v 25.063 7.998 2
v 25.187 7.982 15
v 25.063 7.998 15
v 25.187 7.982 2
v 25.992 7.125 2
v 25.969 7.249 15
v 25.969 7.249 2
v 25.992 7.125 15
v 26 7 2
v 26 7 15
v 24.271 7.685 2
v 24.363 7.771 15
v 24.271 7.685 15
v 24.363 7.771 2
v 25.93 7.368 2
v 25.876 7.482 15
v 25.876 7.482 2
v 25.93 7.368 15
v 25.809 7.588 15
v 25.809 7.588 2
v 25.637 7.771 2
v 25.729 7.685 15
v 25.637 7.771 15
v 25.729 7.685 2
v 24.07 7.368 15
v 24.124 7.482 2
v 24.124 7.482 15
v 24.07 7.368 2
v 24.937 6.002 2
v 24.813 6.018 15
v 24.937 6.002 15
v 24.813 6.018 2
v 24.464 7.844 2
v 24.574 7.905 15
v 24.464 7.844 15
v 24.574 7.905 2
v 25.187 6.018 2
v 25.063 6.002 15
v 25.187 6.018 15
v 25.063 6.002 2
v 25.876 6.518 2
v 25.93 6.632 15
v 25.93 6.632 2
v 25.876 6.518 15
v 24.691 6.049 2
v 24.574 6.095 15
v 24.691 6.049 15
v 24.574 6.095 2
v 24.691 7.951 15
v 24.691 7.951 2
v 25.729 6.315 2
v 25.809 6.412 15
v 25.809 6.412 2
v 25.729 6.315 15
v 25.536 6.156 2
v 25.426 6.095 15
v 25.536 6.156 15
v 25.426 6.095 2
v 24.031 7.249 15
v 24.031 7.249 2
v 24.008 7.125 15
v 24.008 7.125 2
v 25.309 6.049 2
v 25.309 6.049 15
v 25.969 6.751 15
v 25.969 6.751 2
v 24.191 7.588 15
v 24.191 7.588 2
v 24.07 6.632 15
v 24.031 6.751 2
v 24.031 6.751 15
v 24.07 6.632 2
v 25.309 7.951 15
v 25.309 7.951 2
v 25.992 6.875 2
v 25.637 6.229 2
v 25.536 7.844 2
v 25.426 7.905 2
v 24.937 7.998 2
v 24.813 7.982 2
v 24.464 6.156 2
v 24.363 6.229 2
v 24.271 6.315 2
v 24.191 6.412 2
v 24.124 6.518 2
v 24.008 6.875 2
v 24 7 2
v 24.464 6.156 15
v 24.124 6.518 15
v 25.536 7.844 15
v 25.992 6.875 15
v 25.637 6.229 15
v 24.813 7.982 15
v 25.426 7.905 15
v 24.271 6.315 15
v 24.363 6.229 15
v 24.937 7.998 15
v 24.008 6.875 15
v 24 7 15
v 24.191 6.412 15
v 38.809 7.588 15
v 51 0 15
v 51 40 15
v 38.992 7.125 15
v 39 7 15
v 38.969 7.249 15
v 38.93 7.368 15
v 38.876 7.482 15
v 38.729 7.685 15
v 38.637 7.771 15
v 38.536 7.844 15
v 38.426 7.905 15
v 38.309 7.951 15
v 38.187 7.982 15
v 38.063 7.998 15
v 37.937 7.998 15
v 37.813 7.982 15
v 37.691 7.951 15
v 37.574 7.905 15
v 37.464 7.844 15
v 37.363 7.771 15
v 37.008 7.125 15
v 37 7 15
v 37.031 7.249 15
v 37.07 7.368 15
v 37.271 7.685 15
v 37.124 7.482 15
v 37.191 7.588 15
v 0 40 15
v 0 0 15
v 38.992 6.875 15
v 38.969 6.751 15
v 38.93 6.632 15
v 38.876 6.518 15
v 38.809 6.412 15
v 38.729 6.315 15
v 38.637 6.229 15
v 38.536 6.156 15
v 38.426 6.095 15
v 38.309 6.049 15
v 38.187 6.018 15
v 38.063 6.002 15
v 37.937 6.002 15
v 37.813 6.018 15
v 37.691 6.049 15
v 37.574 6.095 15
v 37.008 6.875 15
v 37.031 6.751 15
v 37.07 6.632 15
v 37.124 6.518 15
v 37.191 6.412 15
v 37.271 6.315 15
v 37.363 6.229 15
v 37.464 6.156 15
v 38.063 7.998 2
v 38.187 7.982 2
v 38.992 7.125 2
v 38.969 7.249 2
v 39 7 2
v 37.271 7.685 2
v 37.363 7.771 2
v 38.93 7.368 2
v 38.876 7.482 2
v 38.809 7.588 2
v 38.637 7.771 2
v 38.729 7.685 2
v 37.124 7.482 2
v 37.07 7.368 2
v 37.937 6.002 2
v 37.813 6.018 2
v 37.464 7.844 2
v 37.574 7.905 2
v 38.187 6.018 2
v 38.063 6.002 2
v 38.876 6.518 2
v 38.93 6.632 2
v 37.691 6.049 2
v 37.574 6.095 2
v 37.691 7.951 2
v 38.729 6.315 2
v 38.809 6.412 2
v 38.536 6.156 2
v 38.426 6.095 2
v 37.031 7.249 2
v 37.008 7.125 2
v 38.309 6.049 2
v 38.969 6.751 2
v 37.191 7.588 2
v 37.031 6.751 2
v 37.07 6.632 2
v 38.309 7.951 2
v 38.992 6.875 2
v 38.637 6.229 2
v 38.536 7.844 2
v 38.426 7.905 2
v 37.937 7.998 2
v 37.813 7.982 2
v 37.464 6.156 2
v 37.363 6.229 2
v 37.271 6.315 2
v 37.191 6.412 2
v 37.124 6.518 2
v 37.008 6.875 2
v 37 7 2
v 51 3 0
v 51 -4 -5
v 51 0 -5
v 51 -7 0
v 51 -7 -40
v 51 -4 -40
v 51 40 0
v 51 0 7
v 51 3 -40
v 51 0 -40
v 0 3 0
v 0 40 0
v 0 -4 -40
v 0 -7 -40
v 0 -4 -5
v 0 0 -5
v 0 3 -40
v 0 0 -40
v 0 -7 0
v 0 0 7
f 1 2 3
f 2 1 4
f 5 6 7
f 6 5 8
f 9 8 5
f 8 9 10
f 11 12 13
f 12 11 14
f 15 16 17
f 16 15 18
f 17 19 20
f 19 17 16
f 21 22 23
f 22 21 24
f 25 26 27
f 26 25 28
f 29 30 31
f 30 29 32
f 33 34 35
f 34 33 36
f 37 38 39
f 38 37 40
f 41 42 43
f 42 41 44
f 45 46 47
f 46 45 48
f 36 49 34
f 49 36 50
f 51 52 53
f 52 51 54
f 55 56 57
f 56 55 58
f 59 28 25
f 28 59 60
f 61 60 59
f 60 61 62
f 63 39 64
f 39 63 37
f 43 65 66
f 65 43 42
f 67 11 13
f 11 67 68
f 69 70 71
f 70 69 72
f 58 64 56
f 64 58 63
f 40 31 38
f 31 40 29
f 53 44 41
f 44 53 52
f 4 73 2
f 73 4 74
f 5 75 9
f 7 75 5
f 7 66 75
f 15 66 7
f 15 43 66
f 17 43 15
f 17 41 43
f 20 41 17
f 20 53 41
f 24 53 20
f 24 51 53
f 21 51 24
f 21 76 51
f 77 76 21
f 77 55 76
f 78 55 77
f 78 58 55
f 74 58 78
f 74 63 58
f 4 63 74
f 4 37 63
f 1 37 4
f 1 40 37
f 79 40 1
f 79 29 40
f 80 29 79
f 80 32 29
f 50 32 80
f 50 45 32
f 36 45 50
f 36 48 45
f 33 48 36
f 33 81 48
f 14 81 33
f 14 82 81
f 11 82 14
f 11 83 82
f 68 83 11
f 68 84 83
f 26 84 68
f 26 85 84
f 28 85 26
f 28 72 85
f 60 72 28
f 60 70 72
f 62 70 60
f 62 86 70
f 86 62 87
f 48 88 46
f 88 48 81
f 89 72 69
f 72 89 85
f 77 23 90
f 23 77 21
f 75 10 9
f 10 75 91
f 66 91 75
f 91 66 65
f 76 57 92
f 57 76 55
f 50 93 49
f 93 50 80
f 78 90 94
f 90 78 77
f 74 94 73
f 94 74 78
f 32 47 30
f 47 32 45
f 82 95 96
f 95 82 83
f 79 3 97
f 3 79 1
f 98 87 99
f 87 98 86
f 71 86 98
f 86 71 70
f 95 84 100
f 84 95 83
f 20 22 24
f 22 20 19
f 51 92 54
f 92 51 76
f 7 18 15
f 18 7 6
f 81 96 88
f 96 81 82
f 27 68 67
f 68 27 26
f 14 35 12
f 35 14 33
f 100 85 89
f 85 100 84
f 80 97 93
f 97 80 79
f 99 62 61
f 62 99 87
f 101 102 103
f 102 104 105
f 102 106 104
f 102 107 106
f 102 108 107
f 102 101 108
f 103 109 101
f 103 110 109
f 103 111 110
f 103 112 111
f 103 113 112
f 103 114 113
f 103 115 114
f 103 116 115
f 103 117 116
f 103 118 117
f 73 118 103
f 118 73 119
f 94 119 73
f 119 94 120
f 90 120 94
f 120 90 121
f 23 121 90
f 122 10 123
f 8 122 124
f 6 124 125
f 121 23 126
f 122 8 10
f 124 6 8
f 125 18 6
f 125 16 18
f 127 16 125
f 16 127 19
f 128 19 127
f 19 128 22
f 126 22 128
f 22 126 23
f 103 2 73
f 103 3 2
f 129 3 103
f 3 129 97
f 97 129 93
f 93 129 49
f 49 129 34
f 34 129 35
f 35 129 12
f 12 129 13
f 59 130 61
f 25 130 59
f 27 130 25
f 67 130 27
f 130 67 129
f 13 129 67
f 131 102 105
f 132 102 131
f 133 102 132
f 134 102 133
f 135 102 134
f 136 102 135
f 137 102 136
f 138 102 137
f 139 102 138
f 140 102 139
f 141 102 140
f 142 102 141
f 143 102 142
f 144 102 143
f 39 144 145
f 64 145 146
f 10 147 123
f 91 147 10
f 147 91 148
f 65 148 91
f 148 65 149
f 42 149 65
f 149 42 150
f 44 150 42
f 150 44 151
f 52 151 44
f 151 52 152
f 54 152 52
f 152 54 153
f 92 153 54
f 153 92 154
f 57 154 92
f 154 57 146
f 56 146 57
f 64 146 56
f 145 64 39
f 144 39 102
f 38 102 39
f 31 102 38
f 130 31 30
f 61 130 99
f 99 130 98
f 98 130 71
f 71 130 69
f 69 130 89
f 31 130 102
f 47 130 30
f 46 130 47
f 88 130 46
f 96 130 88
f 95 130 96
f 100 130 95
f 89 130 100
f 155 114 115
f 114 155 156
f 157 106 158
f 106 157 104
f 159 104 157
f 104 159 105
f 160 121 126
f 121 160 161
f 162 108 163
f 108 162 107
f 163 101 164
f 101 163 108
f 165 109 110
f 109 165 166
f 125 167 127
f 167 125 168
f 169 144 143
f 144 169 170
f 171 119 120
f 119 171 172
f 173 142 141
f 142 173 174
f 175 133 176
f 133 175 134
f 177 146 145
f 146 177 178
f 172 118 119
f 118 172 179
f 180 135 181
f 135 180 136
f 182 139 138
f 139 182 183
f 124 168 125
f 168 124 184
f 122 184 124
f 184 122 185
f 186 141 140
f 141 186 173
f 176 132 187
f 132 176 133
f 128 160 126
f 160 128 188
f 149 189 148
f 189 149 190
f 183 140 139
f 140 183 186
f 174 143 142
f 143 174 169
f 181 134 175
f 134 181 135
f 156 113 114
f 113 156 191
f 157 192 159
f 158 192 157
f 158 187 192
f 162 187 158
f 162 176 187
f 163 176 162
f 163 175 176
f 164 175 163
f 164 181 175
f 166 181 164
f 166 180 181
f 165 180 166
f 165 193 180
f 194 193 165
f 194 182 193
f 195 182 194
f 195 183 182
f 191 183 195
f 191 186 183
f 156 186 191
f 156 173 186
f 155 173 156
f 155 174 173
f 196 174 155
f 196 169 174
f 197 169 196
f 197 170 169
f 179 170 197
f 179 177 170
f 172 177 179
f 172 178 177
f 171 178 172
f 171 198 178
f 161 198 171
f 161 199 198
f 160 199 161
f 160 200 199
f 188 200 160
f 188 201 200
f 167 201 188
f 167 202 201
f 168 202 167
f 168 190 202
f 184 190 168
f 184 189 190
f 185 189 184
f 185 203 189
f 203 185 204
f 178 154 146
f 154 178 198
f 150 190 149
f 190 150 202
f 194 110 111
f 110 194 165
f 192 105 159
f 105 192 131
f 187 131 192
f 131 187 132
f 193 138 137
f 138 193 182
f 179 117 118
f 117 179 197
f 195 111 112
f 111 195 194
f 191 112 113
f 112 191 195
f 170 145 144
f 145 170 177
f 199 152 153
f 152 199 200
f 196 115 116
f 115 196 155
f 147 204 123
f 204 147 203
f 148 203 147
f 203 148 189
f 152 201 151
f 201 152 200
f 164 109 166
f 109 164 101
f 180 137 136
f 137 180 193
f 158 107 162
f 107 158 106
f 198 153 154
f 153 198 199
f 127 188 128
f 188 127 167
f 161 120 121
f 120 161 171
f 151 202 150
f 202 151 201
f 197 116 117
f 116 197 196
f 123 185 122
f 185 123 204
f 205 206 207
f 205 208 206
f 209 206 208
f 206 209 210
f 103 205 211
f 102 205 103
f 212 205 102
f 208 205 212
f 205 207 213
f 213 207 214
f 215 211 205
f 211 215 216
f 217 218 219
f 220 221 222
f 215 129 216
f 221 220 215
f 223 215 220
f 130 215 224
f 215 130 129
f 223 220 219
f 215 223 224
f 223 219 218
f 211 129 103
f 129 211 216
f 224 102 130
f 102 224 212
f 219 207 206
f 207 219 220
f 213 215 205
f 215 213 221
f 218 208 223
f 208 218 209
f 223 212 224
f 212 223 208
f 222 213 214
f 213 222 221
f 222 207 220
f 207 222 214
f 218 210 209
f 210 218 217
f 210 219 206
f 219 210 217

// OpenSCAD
// Adapter Tool Rig
// (c) 2018 Harald Mühlhoff, 58300 Wetter

// Width
a = 51;

// Height Top
b = 15;

// Length Top
c = 40;

// Length Side
d = 40;

// Thickness Side
e = 3;

// Diameter Screw Holes
f= 2;

// Height Screw Holes
g = b -2;

// Thickness Makrolon
h = 4;

// Vertical gap
i = 1;

// Height Side Connection
j = 12;

$fn=50;

// Top
difference() {
    cube([a, c, b]);
    
    union() {
        // Screw Holes
        
        ScrewHole();
        
        translate([13, 0, 0])
        ScrewHole();
    }
}


module ScrewHole() {
    translate([f/2 + 24, f/2 + 6, b-g])
    cylinder(d=f, h = g);
}


// Side
translate([0, 0, -d])
cube([a, e, d]);


// Side2
translate([0, -h-e, -d])
cube([a, e, d]);

// Side connection
difference() {
    translate([0, -h-e, -i-h])
    cube([a, 2*e + h, j]);

    // "Hack"
    translate([0, (-h-e), 0])
    rotate([45, 0, 0])
    #cube([a, 2*e + h, j]);
}
